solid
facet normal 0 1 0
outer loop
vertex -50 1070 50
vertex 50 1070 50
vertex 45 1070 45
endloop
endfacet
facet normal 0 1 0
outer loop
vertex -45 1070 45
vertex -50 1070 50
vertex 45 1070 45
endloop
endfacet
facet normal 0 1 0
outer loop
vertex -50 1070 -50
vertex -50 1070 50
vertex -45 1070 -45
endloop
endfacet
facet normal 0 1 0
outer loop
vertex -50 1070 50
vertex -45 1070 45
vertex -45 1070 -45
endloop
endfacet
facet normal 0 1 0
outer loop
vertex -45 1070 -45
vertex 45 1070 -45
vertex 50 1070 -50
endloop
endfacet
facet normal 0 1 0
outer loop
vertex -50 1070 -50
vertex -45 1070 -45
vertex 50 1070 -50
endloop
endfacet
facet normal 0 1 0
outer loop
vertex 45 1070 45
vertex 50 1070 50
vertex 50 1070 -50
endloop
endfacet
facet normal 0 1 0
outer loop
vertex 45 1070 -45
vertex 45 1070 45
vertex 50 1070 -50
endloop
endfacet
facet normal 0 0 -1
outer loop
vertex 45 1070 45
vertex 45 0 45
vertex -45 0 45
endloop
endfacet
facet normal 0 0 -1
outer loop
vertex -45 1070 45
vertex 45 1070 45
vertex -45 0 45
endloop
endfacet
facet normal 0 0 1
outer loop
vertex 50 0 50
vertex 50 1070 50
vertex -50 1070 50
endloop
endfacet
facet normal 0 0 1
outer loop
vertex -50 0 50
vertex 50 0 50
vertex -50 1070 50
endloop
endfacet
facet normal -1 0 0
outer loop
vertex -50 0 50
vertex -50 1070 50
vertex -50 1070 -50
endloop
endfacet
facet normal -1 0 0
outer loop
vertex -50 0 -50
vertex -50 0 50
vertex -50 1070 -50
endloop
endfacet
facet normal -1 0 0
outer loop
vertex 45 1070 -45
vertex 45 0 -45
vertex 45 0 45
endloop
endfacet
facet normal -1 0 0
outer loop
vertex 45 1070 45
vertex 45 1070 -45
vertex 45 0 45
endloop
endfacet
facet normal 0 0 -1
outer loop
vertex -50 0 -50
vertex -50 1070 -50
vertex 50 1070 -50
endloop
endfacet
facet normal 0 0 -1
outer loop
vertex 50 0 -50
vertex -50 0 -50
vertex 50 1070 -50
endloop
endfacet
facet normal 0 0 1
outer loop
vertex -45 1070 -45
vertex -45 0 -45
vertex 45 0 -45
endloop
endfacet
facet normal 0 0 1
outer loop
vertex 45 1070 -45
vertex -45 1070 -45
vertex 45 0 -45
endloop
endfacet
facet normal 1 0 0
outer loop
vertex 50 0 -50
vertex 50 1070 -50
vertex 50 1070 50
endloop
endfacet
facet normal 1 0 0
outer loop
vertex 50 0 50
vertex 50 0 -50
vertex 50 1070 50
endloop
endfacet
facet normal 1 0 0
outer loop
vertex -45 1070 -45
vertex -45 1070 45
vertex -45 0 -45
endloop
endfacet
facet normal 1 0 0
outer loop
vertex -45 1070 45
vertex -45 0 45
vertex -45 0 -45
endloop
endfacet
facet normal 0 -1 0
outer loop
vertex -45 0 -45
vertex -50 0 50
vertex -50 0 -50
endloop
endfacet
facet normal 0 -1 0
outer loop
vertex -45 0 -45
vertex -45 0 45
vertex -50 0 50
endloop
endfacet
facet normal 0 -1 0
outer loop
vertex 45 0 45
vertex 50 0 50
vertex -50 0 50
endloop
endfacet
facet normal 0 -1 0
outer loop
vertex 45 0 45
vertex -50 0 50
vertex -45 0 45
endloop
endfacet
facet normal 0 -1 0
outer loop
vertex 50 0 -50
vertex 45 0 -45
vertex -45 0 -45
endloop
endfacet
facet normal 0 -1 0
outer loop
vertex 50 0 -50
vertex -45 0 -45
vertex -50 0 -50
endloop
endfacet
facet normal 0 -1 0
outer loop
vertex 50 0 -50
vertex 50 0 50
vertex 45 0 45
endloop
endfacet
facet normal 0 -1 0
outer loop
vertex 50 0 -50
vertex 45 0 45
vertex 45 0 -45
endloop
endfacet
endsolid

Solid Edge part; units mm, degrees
sketch "Sketch1" plane through (0, 0, 0) normal (0, -1, 0) x (1, 0, 0)
  line L0 (-50, -50) -> (50, -50)
  line L1 (50, -50) -> (50, 50)
  line L2 (50, 50) -> (-50, 50)
  line L3 (-50, 50) -> (-50, -50)
  line L4 (45, 45) -> (-45, 45)
  line L5 (-45, 45) -> (-45, -45)
  line L6 (-45, -45) -> (45, -45)
  line L7 (45, -45) -> (45, 45)
  dimension "D1" = 5
extrude "Protrusion1" add sketch "Sketch1" against normal blind 1070
properties part number "1983-1000-002"
